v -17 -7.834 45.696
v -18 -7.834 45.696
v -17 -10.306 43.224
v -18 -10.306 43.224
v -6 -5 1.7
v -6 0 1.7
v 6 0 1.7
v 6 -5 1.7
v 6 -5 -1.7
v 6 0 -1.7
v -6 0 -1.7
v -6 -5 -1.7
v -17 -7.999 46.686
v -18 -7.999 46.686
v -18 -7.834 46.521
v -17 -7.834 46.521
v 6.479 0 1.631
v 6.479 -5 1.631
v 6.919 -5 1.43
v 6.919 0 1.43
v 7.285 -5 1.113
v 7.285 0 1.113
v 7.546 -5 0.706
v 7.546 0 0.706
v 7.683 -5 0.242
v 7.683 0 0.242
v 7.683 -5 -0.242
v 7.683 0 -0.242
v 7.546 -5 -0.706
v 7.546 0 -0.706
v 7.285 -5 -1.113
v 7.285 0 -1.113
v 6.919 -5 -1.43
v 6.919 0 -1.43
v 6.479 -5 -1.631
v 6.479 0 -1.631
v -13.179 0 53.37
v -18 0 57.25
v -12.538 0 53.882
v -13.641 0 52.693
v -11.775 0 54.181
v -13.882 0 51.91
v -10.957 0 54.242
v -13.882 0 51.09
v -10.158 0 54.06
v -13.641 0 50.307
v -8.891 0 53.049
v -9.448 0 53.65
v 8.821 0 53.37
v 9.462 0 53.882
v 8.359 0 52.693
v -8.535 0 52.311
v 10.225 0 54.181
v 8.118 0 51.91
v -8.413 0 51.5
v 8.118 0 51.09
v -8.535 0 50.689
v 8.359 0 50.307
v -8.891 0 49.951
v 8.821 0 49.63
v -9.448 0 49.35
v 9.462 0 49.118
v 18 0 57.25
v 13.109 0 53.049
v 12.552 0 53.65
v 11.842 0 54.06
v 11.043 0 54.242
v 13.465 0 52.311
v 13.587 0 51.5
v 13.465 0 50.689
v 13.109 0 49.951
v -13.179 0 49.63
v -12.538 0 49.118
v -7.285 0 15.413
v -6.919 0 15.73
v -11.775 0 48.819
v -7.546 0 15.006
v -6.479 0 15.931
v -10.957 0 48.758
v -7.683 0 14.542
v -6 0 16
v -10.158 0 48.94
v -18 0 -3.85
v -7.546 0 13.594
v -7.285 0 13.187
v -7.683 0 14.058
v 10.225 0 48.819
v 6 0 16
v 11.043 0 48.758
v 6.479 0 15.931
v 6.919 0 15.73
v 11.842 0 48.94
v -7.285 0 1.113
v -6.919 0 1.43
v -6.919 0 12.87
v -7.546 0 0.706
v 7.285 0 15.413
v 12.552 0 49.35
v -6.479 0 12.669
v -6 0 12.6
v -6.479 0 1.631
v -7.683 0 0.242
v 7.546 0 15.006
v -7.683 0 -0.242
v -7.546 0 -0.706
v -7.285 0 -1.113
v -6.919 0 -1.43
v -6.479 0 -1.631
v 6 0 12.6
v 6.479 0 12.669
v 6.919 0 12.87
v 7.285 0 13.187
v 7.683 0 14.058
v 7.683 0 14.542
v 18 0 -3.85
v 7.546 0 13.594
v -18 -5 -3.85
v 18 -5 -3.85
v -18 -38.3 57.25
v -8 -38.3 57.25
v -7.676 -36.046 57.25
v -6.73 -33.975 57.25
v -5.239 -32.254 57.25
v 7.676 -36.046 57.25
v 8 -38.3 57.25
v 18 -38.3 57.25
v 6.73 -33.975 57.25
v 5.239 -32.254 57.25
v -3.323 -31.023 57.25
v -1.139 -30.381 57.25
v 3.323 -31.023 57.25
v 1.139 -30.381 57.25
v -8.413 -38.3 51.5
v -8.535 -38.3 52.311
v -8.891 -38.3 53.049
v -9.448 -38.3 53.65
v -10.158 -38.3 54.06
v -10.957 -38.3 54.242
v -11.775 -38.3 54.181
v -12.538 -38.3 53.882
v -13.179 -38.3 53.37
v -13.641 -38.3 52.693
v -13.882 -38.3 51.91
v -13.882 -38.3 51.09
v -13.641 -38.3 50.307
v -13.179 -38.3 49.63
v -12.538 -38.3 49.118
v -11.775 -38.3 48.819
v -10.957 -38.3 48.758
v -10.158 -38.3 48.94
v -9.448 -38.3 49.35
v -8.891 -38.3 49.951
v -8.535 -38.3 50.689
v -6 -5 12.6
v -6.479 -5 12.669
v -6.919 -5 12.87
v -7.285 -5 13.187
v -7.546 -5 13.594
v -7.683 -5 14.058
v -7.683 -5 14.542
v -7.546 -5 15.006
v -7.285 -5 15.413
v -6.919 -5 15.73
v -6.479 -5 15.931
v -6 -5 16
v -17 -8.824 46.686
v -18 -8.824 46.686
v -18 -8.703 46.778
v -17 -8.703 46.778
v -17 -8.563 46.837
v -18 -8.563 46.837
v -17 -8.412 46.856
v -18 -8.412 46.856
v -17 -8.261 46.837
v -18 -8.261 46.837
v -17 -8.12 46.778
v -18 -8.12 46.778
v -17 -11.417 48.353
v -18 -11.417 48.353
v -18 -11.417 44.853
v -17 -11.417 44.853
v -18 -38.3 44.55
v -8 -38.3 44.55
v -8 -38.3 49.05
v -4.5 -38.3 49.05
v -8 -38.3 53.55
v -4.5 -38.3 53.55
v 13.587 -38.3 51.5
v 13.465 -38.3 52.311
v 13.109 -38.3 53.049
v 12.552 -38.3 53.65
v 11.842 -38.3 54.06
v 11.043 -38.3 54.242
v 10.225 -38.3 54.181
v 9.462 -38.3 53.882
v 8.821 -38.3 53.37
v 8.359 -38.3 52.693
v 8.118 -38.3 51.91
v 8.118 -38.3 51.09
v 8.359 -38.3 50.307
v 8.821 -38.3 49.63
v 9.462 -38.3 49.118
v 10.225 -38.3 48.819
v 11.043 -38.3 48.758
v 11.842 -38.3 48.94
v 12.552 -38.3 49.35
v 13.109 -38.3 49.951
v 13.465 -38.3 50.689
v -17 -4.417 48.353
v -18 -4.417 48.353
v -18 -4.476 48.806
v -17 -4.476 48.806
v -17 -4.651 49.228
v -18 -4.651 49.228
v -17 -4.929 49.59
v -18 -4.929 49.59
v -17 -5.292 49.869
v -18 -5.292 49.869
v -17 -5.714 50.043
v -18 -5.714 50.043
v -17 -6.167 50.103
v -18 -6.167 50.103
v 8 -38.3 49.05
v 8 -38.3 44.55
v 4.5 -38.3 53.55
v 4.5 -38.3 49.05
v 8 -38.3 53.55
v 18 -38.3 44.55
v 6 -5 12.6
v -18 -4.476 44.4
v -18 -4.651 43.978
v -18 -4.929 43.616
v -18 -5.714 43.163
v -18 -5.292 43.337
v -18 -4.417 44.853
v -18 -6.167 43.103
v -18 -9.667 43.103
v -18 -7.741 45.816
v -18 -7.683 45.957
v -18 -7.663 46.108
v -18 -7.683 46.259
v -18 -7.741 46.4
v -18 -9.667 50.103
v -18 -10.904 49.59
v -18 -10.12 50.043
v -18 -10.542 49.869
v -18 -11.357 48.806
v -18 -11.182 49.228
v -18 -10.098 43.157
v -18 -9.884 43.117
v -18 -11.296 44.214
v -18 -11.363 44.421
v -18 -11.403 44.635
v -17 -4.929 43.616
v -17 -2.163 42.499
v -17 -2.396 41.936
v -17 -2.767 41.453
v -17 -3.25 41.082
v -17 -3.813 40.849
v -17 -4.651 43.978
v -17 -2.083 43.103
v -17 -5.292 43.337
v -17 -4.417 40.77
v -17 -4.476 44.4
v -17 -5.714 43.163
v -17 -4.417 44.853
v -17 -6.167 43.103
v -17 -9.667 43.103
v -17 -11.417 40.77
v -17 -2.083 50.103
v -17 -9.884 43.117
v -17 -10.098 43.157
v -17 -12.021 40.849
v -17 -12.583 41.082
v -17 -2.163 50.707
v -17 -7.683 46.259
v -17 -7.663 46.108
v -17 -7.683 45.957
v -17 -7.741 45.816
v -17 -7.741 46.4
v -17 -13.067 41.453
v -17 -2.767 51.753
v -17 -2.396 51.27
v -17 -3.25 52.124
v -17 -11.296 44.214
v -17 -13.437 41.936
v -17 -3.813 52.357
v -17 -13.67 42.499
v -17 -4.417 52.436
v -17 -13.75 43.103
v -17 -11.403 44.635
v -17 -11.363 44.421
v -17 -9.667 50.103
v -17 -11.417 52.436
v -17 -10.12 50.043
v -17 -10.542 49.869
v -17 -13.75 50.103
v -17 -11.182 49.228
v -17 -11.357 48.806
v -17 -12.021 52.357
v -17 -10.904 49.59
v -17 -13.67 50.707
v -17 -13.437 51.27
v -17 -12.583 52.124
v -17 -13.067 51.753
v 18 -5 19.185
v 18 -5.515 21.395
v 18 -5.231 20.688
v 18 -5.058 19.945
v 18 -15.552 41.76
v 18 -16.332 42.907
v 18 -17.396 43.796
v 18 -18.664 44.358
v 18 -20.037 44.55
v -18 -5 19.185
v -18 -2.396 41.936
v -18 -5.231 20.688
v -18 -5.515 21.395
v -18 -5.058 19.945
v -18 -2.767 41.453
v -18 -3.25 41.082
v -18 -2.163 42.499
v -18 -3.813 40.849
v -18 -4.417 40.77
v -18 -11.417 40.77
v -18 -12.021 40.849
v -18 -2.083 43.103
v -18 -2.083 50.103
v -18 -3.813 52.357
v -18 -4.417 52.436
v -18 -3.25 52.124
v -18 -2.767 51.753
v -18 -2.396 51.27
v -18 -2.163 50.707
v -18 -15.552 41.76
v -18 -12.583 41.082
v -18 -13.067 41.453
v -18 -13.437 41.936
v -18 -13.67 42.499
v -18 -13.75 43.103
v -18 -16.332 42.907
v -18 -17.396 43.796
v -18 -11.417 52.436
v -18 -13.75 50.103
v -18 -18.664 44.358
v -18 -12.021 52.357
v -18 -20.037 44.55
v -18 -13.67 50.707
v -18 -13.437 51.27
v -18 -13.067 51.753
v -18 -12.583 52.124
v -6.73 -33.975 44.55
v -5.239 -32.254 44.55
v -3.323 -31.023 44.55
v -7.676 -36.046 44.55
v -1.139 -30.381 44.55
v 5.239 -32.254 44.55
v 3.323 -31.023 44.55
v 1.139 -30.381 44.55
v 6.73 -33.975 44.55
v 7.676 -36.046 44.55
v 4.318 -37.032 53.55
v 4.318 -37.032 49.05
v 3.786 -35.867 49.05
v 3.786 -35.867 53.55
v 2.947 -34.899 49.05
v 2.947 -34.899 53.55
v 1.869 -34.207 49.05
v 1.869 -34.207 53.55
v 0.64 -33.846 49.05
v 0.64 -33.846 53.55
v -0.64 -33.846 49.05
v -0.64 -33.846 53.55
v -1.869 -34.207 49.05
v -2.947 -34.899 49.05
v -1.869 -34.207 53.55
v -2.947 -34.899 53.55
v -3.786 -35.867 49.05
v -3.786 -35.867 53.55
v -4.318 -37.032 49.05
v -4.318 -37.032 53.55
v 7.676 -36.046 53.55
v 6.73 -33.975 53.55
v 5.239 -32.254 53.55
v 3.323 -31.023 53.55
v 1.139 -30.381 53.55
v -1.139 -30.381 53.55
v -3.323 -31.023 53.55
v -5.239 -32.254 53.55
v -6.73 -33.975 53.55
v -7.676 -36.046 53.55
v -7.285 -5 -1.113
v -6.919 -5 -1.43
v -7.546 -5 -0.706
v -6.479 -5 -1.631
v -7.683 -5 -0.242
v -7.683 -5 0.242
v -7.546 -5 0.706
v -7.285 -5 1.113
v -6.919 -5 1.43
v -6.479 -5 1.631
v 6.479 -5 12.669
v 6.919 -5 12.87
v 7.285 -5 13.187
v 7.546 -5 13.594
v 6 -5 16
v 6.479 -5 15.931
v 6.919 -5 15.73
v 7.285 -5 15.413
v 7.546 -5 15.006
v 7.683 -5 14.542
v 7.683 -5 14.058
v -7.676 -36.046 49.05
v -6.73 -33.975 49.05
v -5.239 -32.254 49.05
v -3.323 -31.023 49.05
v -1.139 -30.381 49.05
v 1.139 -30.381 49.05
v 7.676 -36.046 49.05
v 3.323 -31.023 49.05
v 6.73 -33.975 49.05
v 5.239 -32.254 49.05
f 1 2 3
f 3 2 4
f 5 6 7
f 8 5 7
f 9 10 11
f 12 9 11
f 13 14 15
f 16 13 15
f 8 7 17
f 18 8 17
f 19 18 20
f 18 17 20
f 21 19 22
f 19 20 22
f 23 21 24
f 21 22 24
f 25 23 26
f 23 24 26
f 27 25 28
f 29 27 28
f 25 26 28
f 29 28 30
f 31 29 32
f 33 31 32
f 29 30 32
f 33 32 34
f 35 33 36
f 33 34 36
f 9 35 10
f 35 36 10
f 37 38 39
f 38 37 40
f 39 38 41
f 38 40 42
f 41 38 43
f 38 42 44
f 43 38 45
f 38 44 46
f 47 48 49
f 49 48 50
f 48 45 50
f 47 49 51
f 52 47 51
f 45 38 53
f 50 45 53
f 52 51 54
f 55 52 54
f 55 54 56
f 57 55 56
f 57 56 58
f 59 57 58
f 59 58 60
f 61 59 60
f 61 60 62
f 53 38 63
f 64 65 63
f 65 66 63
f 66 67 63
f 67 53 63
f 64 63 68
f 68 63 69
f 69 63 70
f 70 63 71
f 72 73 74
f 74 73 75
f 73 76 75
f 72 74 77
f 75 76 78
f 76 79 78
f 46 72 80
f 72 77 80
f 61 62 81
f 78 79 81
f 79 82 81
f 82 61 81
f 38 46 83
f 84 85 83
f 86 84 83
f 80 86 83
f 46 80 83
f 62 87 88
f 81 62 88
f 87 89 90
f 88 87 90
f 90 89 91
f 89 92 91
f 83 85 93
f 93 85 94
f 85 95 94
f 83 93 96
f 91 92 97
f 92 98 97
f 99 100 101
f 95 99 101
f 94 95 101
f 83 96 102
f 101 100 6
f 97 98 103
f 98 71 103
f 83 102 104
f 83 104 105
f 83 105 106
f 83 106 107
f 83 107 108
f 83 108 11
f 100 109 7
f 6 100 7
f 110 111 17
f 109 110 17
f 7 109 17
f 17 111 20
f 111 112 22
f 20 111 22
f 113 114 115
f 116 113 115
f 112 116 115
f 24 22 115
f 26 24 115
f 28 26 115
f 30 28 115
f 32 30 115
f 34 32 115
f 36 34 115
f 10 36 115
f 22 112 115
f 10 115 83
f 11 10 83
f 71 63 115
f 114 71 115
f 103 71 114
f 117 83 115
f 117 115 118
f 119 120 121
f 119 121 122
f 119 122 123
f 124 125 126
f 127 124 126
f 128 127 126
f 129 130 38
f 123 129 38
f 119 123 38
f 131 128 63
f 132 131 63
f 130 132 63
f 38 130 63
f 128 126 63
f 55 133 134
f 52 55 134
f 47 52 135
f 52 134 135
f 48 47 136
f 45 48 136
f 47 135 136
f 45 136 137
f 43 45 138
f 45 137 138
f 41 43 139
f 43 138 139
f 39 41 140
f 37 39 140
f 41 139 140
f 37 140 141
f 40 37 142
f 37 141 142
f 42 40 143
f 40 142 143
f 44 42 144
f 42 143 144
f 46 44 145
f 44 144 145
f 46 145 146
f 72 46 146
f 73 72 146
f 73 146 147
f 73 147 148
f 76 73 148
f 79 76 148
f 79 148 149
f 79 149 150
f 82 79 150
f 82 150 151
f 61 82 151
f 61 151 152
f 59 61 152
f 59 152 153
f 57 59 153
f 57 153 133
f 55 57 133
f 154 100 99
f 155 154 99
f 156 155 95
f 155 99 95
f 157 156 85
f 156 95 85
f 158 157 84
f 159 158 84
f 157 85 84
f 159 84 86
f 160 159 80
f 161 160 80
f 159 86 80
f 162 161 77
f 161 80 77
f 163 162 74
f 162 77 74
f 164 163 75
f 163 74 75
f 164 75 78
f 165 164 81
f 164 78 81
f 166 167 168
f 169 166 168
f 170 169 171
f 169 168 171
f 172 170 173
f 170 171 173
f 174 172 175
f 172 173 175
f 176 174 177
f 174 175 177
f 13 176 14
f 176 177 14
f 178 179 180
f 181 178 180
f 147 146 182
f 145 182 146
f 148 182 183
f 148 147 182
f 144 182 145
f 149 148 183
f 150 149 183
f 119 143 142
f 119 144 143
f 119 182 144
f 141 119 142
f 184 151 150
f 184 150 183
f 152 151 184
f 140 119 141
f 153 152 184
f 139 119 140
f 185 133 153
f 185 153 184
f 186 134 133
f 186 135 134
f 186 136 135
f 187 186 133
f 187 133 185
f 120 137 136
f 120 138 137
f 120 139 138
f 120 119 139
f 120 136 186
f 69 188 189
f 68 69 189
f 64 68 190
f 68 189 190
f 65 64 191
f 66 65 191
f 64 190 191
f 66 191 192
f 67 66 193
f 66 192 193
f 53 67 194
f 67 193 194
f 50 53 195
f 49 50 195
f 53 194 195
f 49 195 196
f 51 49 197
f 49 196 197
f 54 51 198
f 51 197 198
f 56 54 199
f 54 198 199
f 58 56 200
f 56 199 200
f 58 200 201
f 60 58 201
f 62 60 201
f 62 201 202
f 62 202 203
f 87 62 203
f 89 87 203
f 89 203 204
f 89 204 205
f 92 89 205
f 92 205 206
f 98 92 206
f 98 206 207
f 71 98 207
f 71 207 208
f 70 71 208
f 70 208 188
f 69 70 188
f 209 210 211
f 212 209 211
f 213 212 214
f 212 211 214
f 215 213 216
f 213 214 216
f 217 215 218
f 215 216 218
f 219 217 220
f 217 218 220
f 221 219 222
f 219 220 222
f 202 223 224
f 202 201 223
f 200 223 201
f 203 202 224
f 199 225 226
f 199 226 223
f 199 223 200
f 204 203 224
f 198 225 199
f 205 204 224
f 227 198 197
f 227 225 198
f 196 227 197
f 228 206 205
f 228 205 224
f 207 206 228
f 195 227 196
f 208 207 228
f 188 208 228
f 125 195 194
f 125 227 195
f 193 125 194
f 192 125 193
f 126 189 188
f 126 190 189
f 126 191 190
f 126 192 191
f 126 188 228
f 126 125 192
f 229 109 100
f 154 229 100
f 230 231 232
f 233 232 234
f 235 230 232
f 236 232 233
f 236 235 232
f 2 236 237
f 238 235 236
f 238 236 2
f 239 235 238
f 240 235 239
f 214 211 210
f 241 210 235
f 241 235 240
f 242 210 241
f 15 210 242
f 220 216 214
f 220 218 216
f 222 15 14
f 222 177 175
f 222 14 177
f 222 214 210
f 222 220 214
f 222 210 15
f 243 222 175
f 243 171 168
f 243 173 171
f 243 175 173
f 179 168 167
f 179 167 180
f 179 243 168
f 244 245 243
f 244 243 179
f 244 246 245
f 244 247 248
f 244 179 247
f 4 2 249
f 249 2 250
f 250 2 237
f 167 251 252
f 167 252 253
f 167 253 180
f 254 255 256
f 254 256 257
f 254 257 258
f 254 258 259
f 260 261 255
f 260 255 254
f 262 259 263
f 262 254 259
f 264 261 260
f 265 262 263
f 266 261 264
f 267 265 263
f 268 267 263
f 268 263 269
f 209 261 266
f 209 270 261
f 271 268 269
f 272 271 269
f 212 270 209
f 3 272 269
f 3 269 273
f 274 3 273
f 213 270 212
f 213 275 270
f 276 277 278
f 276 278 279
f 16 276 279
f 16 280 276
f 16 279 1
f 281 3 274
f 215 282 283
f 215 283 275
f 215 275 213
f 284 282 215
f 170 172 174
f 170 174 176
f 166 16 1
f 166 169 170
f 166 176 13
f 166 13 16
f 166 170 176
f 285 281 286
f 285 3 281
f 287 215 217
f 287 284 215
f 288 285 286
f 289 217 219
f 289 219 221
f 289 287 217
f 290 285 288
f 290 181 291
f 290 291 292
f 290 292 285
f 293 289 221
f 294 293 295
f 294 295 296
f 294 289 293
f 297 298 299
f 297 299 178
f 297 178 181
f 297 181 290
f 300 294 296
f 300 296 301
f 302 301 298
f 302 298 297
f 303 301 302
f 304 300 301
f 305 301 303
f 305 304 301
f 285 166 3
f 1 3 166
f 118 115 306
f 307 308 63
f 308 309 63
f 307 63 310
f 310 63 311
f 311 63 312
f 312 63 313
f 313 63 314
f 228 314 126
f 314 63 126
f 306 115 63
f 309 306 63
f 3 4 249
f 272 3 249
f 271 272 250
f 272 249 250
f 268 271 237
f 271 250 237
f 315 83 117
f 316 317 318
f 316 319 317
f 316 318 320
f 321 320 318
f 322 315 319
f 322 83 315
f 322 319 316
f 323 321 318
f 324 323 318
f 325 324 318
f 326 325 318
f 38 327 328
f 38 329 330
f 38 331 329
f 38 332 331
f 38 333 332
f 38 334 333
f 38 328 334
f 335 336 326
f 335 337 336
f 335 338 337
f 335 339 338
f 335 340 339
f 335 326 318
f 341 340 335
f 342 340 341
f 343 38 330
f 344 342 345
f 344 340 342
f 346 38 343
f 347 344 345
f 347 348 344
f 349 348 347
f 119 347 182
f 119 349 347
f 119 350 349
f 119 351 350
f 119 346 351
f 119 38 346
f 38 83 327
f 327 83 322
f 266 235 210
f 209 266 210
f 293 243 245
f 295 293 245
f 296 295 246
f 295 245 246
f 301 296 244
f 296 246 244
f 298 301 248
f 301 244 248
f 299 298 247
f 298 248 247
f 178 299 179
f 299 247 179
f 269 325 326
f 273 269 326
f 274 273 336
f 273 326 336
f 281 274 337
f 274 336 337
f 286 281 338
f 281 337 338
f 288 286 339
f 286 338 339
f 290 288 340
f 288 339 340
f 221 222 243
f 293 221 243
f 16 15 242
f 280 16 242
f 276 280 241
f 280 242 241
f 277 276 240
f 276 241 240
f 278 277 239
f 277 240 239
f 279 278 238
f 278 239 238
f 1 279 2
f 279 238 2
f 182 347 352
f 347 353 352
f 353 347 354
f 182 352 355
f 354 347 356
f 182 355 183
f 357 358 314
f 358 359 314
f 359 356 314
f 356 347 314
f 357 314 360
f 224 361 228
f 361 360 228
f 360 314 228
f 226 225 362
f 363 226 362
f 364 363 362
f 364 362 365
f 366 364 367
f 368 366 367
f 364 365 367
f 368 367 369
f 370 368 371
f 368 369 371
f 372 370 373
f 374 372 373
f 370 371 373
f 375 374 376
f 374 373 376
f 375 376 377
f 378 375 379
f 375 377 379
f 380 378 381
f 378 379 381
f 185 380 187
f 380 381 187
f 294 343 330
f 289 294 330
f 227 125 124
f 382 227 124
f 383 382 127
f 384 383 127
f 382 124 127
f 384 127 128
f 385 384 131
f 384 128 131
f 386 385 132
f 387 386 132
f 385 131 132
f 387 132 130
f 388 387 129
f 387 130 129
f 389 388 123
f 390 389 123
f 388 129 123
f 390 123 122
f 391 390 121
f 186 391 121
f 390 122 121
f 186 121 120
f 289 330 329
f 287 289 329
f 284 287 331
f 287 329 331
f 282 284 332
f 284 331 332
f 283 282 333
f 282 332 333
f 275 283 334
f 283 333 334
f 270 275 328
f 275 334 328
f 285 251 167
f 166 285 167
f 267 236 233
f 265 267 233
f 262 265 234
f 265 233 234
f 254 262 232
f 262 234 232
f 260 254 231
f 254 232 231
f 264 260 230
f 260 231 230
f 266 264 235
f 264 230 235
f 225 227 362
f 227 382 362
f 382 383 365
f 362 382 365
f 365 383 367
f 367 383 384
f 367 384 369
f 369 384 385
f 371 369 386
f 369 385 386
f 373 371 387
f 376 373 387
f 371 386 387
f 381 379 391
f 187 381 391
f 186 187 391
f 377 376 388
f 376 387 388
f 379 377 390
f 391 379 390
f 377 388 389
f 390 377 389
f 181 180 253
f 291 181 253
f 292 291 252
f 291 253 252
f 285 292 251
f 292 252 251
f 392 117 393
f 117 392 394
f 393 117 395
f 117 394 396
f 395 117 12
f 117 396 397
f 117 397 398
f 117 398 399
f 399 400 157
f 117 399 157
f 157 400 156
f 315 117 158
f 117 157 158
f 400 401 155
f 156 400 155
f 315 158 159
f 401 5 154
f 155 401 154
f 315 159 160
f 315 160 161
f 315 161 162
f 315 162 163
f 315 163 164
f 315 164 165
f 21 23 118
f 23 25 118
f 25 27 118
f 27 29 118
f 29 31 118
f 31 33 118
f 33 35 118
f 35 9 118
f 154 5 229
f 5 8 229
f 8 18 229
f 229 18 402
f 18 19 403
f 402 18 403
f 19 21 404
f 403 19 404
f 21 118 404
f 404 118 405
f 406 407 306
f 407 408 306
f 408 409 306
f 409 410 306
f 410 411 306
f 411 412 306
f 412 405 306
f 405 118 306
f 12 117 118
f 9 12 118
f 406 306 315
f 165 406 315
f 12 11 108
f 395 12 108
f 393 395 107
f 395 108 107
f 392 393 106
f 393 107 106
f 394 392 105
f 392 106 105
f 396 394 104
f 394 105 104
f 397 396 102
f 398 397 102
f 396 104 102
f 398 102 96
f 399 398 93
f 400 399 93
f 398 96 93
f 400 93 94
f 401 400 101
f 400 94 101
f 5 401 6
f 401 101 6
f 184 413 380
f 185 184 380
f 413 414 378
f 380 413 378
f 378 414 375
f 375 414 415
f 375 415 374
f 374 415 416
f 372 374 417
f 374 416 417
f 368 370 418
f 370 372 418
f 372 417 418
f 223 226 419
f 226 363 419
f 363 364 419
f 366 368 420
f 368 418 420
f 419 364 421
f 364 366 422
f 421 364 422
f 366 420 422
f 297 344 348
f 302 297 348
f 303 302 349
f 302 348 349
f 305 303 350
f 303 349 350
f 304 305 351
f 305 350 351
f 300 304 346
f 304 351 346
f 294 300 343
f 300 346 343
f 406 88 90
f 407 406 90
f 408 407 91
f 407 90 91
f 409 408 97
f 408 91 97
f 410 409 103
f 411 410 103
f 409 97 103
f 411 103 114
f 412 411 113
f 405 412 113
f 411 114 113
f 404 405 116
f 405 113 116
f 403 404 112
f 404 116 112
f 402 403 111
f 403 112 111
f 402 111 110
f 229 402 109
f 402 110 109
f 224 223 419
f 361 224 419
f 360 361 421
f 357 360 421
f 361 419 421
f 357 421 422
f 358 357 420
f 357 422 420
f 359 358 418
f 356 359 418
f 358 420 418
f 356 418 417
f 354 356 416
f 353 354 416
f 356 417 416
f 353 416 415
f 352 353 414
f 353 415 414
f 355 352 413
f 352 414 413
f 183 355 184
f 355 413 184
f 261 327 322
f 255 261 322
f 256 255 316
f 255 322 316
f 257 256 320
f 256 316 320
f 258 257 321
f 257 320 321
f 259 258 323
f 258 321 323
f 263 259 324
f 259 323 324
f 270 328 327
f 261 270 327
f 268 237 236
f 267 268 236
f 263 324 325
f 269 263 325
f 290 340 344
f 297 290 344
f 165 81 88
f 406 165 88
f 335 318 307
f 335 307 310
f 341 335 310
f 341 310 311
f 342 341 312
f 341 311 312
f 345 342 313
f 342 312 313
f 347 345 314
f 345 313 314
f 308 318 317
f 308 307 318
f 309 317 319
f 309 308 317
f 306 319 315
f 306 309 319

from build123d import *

# Parameters (mm, degrees)
F0_W      = 30
F0_H      = 22
F1_DEPTH  = 5
F2_DEPTH  = 39.1
F3_W      = 30
F3_H      = 12.7
F4_DEPTH  = 50
F8_W      = 30
F8_H      = 5
F9_DEPTH  = 25
F10_W     = 30
F10_H     = 5
F11_DEPTH = 5
F12_W     = 30
F12_H     = 5
F13_DEPTH = 25
F15_DEPTH = 25
F16_DEPTH = 3
F18_DEPTH = 3
F19_DEPTH = 3
F21_DEPTH = 3
F23_DEPTH = 30
F24_R     = 2.75
F25_DEPTH = 500
F26_W     = 68.0921077728
F26_H     = 72.8289508261
F27_DEPTH = 25
F29_DEPTH = 36
F30_R     = 4.99999
F32_DEPTH = 1
F33_W     = 82.302633673
F33_H     = 75.4934260622
F34_DEPTH = 50


# Not quite as in the source:
# - a fillet or chamfer is up to 0.001 mm smaller than in the source, because OpenCascade refuses the exact size


with BuildPart() as f1:
    # F0 (on Front) → F1 (new body)
    with BuildSketch(Plane.XZ):
        with Locations((0, 7.15)):
            Rectangle(F0_W, F0_H)
        with BuildLine():
            ThreePointArc((-6, -1.7), (-7.7, 0), (-6, 1.7))
            Line((-6, 1.7), (6, 1.7))
            ThreePointArc((6, 1.7), (7.7, 0), (6, -1.7))
            Line((6, -1.7), (-6, -1.7))
        make_face(mode=Mode.SUBTRACT)
        with BuildLine():
            ThreePointArc((-6, 12.6), (-7.7, 14.3), (-6, 16))
            Line((-6, 16), (6, 16))
            ThreePointArc((6, 16), (7.7, 14.3), (6, 12.6))
            Line((6, 12.6), (-6, 12.6))
        make_face(mode=Mode.SUBTRACT)
    extrude(amount=F1_DEPTH)

    # F2 (add): a face of the model
    f2_faces = [f1.faces().sort_by_distance(p)[0] for p in [
        (0, -2.5, 18.15),
    ]]
    extrude(f2_faces, amount=F2_DEPTH)

    # F3 (on face) → F4 (join)
    with BuildSketch(Plane.XZ.offset(5)):
        with Locations((0, 50.9)):
            Rectangle(F3_W, F3_H)
    extrude(amount=F4_DEPTH)

    # F6 (on offset) → F7 (revolve, cut)
    with BuildSketch(Plane.XZ.offset(38.3)):
        Polygon((8, 57.25), (0, 57.25), (0, 44.55), (8, 44.55), (8, 49.05), (4.5, 49.05), (4.5, 53.55), (8, 53.55), align=None)
    revolve(axis=Axis((0, -38.3, 50.9), (0, 0, 1)), mode=Mode.SUBTRACT)

    # F8 (on face) → F9 (join)
    with BuildSketch(Plane(origin=(0, 0, 0), x_dir=(-1, 0, 0), z_dir=(0, 1, 0))):
        with Locations((0, 36.45)):
            Rectangle(F8_W, F8_H)
    extrude(amount=F9_DEPTH)

    # F10 (on face) → F11 (join)
    with BuildSketch(Plane(origin=(0, 0, 33.95), x_dir=(1, 0, 0), z_dir=(0, 0, -1))):
        with Locations((0, -22.5)):
            Rectangle(F10_W, F10_H)
    extrude(amount=F11_DEPTH)

    # F12 (on face) → F13 (join)
    with BuildSketch(Plane(origin=(0, 25, 0), x_dir=(-1, 0, 0), z_dir=(0, 1, 0))):
        with Locations((0, 31.45)):
            Rectangle(F12_W, F12_H)
    extrude(amount=F13_DEPTH)

    # F14 (on face) → F15 (cut)
    with BuildSketch(Plane.XY.offset(33.95)):
        with BuildLine():
            ThreePointArc((7.4548611111, 38.3216117173), (0, 45), (-7.4548611111, 38.3216117173))
            ThreePointArc((-7.4548611111, 38.3216117173), (-10.75, 37.5), (-7.4548611111, 36.6783882827))
            ThreePointArc((-7.4548611111, 36.6783882827), (0, 30), (7.4548611111, 36.6783882827))
            ThreePointArc((7.4548611111, 36.6783882827), (10.75, 37.5), (7.4548611111, 38.3216117173))
        make_face()
    extrude(amount=-F15_DEPTH, mode=Mode.SUBTRACT)

    # F16 (add): a face of the model
    f16_faces = [f1.faces().sort_by_distance(p)[0] for p in [
        (15, -2.5, -2.6351662665),
    ]]
    extrude(f16_faces, amount=F16_DEPTH)

    # F17 (on face) → F18 (join)
    with BuildSketch(Plane.YZ.offset(18)):
        Polygon((50, 33.95), (0, 57.25), (0, 38.95), (25, 38.95), (25, 33.95), align=None)
    extrude(amount=-F18_DEPTH)

    # F19 (add): a face of the model
    f19_faces = [f1.faces().sort_by_distance(p)[0] for p in [
        (-15, -2.5, -2.6351662665),
    ]]
    extrude(f19_faces, amount=F19_DEPTH)

    # F20 (on face) → F21 (join)
    with BuildSketch(Plane(origin=(-18, 0, 0), x_dir=(0, -1, 0), z_dir=(-1, 0, 0))):
        Polygon((0, 57.25), (-50, 33.95), (-25, 33.95), (-25, 38.95), (0, 38.95), align=None)
    extrude(amount=-F21_DEPTH)

    # F22 (on face) → F23 (join, through all)
    with BuildSketch(Plane(origin=(15, 0, 0), x_dir=(0, -1, 0), z_dir=(-1, 0, 0))):
        Polygon((-25, 45.6), (-25, 38.95), (0, 38.95), (0, 57.25), align=None)
    extrude(amount=F23_DEPTH)

    # F24 (on face) → F25 (cut)
    with BuildSketch(Plane.XZ.offset(55)):
        with Locations((-11.1628601777, 51.5)):
            Circle(F24_R)
        with Locations((10.8371398223, 51.5)):
            Circle(F24_R)
    extrude(amount=-F25_DEPTH, mode=Mode.SUBTRACT)

    # F26 (on offset) → F27 (cut)
    with BuildSketch(Plane.XZ.offset(38.3)):
        with Locations((0.2960525453, 29.3092119973)):
            Rectangle(F26_W, F26_H)
    extrude(amount=F27_DEPTH, mode=Mode.SUBTRACT)

    # F28 (on face) → F29 (join)
    with BuildSketch(Plane(origin=(-18, 0, 0), x_dir=(0, -1, 0), z_dir=(-1, 0, 0))):
        Polygon((5, 44.55), (5, 20.35), (16.9268529862, 44.55), align=None)
    extrude(amount=-F29_DEPTH)

    # F30 (radius 5 in the source; OpenCascade refuses exactly that, so slightly less here)
    f30_edges = [f1.edges().sort_by_distance(p)[0] for p in [
        (0, -16.926853, 44.55),
        (0, 20, 33.95),
        (0, -5, 20.35),
    ]]
    fillet(f30_edges, radius=F30_R)

    # F31 (on face) → F32 (cut)
    with BuildSketch(Plane(origin=(-18, 0, 0), x_dir=(0, -1, 0), z_dir=(-1, 0, 0))):
        with BuildLine():
            ThreePointArc((2.083333126, 43.103029569), (2.7667506365, 41.4531137462), (4.4166664593, 40.7696962357))
            Line((4.4166664593, 40.7696962357), (11.4166664593, 40.7696962357))
            ThreePointArc((11.4166664593, 40.7696962357), (13.0665822821, 41.4531137462), (13.7499997926, 43.103029569))
            Line((13.7499997926, 43.103029569), (13.7499997926, 50.103029569))
            ThreePointArc((13.7499997926, 50.103029569), (13.0665822821, 51.7529453918), (11.4166664593, 52.4363629023))
            Line((11.4166664593, 52.4363629023), (4.4166664593, 52.4363629023))
            ThreePointArc((4.4166664593, 52.4363629023), (2.7667506365, 51.7529453918), (2.083333126, 50.103029569))
            Line((2.083333126, 50.103029569), (2.083333126, 43.103029569))
        make_face()
        with BuildLine():
            Line((9.6666664593, 43.103029569), (6.1666664593, 43.103029569))
            ThreePointArc((6.1666664593, 43.103029569), (4.9292295922, 43.6155927019), (4.4166664593, 44.853029569))
            Line((4.4166664593, 44.853029569), (4.4166664593, 48.353029569))
            ThreePointArc((4.4166664593, 48.353029569), (4.9292295922, 49.5904664361), (6.1666664593, 50.103029569))
            Line((6.1666664593, 50.103029569), (9.6666664593, 50.103029569))
            ThreePointArc((9.6666664593, 50.103029569), (10.9041033264, 49.5904664361), (11.4166664593, 48.353029569))
            Line((11.4166664593, 48.353029569), (11.4166664593, 44.853029569))
            ThreePointArc((11.4166664593, 44.853029569), (11.3861769533, 44.5277855668), (11.2957708468, 44.2138747406))
            Line((11.2957708593, 44.2138747357), (8.8241202093, 46.6855253857))
            ThreePointArc((8.8241201983, 46.6855253747), (8.4116412426, 46.8563797523), (7.9991622869, 46.6855253747))
            Line((7.999162276, 46.6855253857), (7.9166664593, 46.603029569))
            Line((7.9166664593, 46.603029569), (7.8341706426, 46.5205337523))
            ThreePointArc((7.8341706536, 46.5205337413), (7.663316276, 46.1080547857), (7.8341706536, 45.69557583))
            Line((7.8341706426, 45.695575819), (10.3058212926, 43.223925169))
            ThreePointArc((10.3058212877, 43.2239251815), (9.9919104615, 43.133519075), (9.6666664593, 43.103029569))
        make_face(mode=Mode.SUBTRACT)
    extrude(amount=-F32_DEPTH, mode=Mode.SUBTRACT)

    # F33 (on face) → F34 (cut)
    with BuildSketch(Plane(origin=(0, 50, 0), x_dir=(-1, 0, 0), z_dir=(0, 1, 0))):
        with Locations((4.7368425876, 23.2401336543)):
            Rectangle(F33_W, F33_H)
        Polygon((-18, 33.95), (-15, 33.95), (15, 33.95), (18, 33.95), (18, 28.95), (-18, 28.95), align=None, mode=Mode.SUBTRACT)
        Polygon((15, 33.95), (-15, 33.95), (-18, 33.95), (-18, 28.95), (18, 28.95), (18, 33.95), align=None)
    extrude(amount=-F34_DEPTH, mode=Mode.SUBTRACT)


solid = f1.part
